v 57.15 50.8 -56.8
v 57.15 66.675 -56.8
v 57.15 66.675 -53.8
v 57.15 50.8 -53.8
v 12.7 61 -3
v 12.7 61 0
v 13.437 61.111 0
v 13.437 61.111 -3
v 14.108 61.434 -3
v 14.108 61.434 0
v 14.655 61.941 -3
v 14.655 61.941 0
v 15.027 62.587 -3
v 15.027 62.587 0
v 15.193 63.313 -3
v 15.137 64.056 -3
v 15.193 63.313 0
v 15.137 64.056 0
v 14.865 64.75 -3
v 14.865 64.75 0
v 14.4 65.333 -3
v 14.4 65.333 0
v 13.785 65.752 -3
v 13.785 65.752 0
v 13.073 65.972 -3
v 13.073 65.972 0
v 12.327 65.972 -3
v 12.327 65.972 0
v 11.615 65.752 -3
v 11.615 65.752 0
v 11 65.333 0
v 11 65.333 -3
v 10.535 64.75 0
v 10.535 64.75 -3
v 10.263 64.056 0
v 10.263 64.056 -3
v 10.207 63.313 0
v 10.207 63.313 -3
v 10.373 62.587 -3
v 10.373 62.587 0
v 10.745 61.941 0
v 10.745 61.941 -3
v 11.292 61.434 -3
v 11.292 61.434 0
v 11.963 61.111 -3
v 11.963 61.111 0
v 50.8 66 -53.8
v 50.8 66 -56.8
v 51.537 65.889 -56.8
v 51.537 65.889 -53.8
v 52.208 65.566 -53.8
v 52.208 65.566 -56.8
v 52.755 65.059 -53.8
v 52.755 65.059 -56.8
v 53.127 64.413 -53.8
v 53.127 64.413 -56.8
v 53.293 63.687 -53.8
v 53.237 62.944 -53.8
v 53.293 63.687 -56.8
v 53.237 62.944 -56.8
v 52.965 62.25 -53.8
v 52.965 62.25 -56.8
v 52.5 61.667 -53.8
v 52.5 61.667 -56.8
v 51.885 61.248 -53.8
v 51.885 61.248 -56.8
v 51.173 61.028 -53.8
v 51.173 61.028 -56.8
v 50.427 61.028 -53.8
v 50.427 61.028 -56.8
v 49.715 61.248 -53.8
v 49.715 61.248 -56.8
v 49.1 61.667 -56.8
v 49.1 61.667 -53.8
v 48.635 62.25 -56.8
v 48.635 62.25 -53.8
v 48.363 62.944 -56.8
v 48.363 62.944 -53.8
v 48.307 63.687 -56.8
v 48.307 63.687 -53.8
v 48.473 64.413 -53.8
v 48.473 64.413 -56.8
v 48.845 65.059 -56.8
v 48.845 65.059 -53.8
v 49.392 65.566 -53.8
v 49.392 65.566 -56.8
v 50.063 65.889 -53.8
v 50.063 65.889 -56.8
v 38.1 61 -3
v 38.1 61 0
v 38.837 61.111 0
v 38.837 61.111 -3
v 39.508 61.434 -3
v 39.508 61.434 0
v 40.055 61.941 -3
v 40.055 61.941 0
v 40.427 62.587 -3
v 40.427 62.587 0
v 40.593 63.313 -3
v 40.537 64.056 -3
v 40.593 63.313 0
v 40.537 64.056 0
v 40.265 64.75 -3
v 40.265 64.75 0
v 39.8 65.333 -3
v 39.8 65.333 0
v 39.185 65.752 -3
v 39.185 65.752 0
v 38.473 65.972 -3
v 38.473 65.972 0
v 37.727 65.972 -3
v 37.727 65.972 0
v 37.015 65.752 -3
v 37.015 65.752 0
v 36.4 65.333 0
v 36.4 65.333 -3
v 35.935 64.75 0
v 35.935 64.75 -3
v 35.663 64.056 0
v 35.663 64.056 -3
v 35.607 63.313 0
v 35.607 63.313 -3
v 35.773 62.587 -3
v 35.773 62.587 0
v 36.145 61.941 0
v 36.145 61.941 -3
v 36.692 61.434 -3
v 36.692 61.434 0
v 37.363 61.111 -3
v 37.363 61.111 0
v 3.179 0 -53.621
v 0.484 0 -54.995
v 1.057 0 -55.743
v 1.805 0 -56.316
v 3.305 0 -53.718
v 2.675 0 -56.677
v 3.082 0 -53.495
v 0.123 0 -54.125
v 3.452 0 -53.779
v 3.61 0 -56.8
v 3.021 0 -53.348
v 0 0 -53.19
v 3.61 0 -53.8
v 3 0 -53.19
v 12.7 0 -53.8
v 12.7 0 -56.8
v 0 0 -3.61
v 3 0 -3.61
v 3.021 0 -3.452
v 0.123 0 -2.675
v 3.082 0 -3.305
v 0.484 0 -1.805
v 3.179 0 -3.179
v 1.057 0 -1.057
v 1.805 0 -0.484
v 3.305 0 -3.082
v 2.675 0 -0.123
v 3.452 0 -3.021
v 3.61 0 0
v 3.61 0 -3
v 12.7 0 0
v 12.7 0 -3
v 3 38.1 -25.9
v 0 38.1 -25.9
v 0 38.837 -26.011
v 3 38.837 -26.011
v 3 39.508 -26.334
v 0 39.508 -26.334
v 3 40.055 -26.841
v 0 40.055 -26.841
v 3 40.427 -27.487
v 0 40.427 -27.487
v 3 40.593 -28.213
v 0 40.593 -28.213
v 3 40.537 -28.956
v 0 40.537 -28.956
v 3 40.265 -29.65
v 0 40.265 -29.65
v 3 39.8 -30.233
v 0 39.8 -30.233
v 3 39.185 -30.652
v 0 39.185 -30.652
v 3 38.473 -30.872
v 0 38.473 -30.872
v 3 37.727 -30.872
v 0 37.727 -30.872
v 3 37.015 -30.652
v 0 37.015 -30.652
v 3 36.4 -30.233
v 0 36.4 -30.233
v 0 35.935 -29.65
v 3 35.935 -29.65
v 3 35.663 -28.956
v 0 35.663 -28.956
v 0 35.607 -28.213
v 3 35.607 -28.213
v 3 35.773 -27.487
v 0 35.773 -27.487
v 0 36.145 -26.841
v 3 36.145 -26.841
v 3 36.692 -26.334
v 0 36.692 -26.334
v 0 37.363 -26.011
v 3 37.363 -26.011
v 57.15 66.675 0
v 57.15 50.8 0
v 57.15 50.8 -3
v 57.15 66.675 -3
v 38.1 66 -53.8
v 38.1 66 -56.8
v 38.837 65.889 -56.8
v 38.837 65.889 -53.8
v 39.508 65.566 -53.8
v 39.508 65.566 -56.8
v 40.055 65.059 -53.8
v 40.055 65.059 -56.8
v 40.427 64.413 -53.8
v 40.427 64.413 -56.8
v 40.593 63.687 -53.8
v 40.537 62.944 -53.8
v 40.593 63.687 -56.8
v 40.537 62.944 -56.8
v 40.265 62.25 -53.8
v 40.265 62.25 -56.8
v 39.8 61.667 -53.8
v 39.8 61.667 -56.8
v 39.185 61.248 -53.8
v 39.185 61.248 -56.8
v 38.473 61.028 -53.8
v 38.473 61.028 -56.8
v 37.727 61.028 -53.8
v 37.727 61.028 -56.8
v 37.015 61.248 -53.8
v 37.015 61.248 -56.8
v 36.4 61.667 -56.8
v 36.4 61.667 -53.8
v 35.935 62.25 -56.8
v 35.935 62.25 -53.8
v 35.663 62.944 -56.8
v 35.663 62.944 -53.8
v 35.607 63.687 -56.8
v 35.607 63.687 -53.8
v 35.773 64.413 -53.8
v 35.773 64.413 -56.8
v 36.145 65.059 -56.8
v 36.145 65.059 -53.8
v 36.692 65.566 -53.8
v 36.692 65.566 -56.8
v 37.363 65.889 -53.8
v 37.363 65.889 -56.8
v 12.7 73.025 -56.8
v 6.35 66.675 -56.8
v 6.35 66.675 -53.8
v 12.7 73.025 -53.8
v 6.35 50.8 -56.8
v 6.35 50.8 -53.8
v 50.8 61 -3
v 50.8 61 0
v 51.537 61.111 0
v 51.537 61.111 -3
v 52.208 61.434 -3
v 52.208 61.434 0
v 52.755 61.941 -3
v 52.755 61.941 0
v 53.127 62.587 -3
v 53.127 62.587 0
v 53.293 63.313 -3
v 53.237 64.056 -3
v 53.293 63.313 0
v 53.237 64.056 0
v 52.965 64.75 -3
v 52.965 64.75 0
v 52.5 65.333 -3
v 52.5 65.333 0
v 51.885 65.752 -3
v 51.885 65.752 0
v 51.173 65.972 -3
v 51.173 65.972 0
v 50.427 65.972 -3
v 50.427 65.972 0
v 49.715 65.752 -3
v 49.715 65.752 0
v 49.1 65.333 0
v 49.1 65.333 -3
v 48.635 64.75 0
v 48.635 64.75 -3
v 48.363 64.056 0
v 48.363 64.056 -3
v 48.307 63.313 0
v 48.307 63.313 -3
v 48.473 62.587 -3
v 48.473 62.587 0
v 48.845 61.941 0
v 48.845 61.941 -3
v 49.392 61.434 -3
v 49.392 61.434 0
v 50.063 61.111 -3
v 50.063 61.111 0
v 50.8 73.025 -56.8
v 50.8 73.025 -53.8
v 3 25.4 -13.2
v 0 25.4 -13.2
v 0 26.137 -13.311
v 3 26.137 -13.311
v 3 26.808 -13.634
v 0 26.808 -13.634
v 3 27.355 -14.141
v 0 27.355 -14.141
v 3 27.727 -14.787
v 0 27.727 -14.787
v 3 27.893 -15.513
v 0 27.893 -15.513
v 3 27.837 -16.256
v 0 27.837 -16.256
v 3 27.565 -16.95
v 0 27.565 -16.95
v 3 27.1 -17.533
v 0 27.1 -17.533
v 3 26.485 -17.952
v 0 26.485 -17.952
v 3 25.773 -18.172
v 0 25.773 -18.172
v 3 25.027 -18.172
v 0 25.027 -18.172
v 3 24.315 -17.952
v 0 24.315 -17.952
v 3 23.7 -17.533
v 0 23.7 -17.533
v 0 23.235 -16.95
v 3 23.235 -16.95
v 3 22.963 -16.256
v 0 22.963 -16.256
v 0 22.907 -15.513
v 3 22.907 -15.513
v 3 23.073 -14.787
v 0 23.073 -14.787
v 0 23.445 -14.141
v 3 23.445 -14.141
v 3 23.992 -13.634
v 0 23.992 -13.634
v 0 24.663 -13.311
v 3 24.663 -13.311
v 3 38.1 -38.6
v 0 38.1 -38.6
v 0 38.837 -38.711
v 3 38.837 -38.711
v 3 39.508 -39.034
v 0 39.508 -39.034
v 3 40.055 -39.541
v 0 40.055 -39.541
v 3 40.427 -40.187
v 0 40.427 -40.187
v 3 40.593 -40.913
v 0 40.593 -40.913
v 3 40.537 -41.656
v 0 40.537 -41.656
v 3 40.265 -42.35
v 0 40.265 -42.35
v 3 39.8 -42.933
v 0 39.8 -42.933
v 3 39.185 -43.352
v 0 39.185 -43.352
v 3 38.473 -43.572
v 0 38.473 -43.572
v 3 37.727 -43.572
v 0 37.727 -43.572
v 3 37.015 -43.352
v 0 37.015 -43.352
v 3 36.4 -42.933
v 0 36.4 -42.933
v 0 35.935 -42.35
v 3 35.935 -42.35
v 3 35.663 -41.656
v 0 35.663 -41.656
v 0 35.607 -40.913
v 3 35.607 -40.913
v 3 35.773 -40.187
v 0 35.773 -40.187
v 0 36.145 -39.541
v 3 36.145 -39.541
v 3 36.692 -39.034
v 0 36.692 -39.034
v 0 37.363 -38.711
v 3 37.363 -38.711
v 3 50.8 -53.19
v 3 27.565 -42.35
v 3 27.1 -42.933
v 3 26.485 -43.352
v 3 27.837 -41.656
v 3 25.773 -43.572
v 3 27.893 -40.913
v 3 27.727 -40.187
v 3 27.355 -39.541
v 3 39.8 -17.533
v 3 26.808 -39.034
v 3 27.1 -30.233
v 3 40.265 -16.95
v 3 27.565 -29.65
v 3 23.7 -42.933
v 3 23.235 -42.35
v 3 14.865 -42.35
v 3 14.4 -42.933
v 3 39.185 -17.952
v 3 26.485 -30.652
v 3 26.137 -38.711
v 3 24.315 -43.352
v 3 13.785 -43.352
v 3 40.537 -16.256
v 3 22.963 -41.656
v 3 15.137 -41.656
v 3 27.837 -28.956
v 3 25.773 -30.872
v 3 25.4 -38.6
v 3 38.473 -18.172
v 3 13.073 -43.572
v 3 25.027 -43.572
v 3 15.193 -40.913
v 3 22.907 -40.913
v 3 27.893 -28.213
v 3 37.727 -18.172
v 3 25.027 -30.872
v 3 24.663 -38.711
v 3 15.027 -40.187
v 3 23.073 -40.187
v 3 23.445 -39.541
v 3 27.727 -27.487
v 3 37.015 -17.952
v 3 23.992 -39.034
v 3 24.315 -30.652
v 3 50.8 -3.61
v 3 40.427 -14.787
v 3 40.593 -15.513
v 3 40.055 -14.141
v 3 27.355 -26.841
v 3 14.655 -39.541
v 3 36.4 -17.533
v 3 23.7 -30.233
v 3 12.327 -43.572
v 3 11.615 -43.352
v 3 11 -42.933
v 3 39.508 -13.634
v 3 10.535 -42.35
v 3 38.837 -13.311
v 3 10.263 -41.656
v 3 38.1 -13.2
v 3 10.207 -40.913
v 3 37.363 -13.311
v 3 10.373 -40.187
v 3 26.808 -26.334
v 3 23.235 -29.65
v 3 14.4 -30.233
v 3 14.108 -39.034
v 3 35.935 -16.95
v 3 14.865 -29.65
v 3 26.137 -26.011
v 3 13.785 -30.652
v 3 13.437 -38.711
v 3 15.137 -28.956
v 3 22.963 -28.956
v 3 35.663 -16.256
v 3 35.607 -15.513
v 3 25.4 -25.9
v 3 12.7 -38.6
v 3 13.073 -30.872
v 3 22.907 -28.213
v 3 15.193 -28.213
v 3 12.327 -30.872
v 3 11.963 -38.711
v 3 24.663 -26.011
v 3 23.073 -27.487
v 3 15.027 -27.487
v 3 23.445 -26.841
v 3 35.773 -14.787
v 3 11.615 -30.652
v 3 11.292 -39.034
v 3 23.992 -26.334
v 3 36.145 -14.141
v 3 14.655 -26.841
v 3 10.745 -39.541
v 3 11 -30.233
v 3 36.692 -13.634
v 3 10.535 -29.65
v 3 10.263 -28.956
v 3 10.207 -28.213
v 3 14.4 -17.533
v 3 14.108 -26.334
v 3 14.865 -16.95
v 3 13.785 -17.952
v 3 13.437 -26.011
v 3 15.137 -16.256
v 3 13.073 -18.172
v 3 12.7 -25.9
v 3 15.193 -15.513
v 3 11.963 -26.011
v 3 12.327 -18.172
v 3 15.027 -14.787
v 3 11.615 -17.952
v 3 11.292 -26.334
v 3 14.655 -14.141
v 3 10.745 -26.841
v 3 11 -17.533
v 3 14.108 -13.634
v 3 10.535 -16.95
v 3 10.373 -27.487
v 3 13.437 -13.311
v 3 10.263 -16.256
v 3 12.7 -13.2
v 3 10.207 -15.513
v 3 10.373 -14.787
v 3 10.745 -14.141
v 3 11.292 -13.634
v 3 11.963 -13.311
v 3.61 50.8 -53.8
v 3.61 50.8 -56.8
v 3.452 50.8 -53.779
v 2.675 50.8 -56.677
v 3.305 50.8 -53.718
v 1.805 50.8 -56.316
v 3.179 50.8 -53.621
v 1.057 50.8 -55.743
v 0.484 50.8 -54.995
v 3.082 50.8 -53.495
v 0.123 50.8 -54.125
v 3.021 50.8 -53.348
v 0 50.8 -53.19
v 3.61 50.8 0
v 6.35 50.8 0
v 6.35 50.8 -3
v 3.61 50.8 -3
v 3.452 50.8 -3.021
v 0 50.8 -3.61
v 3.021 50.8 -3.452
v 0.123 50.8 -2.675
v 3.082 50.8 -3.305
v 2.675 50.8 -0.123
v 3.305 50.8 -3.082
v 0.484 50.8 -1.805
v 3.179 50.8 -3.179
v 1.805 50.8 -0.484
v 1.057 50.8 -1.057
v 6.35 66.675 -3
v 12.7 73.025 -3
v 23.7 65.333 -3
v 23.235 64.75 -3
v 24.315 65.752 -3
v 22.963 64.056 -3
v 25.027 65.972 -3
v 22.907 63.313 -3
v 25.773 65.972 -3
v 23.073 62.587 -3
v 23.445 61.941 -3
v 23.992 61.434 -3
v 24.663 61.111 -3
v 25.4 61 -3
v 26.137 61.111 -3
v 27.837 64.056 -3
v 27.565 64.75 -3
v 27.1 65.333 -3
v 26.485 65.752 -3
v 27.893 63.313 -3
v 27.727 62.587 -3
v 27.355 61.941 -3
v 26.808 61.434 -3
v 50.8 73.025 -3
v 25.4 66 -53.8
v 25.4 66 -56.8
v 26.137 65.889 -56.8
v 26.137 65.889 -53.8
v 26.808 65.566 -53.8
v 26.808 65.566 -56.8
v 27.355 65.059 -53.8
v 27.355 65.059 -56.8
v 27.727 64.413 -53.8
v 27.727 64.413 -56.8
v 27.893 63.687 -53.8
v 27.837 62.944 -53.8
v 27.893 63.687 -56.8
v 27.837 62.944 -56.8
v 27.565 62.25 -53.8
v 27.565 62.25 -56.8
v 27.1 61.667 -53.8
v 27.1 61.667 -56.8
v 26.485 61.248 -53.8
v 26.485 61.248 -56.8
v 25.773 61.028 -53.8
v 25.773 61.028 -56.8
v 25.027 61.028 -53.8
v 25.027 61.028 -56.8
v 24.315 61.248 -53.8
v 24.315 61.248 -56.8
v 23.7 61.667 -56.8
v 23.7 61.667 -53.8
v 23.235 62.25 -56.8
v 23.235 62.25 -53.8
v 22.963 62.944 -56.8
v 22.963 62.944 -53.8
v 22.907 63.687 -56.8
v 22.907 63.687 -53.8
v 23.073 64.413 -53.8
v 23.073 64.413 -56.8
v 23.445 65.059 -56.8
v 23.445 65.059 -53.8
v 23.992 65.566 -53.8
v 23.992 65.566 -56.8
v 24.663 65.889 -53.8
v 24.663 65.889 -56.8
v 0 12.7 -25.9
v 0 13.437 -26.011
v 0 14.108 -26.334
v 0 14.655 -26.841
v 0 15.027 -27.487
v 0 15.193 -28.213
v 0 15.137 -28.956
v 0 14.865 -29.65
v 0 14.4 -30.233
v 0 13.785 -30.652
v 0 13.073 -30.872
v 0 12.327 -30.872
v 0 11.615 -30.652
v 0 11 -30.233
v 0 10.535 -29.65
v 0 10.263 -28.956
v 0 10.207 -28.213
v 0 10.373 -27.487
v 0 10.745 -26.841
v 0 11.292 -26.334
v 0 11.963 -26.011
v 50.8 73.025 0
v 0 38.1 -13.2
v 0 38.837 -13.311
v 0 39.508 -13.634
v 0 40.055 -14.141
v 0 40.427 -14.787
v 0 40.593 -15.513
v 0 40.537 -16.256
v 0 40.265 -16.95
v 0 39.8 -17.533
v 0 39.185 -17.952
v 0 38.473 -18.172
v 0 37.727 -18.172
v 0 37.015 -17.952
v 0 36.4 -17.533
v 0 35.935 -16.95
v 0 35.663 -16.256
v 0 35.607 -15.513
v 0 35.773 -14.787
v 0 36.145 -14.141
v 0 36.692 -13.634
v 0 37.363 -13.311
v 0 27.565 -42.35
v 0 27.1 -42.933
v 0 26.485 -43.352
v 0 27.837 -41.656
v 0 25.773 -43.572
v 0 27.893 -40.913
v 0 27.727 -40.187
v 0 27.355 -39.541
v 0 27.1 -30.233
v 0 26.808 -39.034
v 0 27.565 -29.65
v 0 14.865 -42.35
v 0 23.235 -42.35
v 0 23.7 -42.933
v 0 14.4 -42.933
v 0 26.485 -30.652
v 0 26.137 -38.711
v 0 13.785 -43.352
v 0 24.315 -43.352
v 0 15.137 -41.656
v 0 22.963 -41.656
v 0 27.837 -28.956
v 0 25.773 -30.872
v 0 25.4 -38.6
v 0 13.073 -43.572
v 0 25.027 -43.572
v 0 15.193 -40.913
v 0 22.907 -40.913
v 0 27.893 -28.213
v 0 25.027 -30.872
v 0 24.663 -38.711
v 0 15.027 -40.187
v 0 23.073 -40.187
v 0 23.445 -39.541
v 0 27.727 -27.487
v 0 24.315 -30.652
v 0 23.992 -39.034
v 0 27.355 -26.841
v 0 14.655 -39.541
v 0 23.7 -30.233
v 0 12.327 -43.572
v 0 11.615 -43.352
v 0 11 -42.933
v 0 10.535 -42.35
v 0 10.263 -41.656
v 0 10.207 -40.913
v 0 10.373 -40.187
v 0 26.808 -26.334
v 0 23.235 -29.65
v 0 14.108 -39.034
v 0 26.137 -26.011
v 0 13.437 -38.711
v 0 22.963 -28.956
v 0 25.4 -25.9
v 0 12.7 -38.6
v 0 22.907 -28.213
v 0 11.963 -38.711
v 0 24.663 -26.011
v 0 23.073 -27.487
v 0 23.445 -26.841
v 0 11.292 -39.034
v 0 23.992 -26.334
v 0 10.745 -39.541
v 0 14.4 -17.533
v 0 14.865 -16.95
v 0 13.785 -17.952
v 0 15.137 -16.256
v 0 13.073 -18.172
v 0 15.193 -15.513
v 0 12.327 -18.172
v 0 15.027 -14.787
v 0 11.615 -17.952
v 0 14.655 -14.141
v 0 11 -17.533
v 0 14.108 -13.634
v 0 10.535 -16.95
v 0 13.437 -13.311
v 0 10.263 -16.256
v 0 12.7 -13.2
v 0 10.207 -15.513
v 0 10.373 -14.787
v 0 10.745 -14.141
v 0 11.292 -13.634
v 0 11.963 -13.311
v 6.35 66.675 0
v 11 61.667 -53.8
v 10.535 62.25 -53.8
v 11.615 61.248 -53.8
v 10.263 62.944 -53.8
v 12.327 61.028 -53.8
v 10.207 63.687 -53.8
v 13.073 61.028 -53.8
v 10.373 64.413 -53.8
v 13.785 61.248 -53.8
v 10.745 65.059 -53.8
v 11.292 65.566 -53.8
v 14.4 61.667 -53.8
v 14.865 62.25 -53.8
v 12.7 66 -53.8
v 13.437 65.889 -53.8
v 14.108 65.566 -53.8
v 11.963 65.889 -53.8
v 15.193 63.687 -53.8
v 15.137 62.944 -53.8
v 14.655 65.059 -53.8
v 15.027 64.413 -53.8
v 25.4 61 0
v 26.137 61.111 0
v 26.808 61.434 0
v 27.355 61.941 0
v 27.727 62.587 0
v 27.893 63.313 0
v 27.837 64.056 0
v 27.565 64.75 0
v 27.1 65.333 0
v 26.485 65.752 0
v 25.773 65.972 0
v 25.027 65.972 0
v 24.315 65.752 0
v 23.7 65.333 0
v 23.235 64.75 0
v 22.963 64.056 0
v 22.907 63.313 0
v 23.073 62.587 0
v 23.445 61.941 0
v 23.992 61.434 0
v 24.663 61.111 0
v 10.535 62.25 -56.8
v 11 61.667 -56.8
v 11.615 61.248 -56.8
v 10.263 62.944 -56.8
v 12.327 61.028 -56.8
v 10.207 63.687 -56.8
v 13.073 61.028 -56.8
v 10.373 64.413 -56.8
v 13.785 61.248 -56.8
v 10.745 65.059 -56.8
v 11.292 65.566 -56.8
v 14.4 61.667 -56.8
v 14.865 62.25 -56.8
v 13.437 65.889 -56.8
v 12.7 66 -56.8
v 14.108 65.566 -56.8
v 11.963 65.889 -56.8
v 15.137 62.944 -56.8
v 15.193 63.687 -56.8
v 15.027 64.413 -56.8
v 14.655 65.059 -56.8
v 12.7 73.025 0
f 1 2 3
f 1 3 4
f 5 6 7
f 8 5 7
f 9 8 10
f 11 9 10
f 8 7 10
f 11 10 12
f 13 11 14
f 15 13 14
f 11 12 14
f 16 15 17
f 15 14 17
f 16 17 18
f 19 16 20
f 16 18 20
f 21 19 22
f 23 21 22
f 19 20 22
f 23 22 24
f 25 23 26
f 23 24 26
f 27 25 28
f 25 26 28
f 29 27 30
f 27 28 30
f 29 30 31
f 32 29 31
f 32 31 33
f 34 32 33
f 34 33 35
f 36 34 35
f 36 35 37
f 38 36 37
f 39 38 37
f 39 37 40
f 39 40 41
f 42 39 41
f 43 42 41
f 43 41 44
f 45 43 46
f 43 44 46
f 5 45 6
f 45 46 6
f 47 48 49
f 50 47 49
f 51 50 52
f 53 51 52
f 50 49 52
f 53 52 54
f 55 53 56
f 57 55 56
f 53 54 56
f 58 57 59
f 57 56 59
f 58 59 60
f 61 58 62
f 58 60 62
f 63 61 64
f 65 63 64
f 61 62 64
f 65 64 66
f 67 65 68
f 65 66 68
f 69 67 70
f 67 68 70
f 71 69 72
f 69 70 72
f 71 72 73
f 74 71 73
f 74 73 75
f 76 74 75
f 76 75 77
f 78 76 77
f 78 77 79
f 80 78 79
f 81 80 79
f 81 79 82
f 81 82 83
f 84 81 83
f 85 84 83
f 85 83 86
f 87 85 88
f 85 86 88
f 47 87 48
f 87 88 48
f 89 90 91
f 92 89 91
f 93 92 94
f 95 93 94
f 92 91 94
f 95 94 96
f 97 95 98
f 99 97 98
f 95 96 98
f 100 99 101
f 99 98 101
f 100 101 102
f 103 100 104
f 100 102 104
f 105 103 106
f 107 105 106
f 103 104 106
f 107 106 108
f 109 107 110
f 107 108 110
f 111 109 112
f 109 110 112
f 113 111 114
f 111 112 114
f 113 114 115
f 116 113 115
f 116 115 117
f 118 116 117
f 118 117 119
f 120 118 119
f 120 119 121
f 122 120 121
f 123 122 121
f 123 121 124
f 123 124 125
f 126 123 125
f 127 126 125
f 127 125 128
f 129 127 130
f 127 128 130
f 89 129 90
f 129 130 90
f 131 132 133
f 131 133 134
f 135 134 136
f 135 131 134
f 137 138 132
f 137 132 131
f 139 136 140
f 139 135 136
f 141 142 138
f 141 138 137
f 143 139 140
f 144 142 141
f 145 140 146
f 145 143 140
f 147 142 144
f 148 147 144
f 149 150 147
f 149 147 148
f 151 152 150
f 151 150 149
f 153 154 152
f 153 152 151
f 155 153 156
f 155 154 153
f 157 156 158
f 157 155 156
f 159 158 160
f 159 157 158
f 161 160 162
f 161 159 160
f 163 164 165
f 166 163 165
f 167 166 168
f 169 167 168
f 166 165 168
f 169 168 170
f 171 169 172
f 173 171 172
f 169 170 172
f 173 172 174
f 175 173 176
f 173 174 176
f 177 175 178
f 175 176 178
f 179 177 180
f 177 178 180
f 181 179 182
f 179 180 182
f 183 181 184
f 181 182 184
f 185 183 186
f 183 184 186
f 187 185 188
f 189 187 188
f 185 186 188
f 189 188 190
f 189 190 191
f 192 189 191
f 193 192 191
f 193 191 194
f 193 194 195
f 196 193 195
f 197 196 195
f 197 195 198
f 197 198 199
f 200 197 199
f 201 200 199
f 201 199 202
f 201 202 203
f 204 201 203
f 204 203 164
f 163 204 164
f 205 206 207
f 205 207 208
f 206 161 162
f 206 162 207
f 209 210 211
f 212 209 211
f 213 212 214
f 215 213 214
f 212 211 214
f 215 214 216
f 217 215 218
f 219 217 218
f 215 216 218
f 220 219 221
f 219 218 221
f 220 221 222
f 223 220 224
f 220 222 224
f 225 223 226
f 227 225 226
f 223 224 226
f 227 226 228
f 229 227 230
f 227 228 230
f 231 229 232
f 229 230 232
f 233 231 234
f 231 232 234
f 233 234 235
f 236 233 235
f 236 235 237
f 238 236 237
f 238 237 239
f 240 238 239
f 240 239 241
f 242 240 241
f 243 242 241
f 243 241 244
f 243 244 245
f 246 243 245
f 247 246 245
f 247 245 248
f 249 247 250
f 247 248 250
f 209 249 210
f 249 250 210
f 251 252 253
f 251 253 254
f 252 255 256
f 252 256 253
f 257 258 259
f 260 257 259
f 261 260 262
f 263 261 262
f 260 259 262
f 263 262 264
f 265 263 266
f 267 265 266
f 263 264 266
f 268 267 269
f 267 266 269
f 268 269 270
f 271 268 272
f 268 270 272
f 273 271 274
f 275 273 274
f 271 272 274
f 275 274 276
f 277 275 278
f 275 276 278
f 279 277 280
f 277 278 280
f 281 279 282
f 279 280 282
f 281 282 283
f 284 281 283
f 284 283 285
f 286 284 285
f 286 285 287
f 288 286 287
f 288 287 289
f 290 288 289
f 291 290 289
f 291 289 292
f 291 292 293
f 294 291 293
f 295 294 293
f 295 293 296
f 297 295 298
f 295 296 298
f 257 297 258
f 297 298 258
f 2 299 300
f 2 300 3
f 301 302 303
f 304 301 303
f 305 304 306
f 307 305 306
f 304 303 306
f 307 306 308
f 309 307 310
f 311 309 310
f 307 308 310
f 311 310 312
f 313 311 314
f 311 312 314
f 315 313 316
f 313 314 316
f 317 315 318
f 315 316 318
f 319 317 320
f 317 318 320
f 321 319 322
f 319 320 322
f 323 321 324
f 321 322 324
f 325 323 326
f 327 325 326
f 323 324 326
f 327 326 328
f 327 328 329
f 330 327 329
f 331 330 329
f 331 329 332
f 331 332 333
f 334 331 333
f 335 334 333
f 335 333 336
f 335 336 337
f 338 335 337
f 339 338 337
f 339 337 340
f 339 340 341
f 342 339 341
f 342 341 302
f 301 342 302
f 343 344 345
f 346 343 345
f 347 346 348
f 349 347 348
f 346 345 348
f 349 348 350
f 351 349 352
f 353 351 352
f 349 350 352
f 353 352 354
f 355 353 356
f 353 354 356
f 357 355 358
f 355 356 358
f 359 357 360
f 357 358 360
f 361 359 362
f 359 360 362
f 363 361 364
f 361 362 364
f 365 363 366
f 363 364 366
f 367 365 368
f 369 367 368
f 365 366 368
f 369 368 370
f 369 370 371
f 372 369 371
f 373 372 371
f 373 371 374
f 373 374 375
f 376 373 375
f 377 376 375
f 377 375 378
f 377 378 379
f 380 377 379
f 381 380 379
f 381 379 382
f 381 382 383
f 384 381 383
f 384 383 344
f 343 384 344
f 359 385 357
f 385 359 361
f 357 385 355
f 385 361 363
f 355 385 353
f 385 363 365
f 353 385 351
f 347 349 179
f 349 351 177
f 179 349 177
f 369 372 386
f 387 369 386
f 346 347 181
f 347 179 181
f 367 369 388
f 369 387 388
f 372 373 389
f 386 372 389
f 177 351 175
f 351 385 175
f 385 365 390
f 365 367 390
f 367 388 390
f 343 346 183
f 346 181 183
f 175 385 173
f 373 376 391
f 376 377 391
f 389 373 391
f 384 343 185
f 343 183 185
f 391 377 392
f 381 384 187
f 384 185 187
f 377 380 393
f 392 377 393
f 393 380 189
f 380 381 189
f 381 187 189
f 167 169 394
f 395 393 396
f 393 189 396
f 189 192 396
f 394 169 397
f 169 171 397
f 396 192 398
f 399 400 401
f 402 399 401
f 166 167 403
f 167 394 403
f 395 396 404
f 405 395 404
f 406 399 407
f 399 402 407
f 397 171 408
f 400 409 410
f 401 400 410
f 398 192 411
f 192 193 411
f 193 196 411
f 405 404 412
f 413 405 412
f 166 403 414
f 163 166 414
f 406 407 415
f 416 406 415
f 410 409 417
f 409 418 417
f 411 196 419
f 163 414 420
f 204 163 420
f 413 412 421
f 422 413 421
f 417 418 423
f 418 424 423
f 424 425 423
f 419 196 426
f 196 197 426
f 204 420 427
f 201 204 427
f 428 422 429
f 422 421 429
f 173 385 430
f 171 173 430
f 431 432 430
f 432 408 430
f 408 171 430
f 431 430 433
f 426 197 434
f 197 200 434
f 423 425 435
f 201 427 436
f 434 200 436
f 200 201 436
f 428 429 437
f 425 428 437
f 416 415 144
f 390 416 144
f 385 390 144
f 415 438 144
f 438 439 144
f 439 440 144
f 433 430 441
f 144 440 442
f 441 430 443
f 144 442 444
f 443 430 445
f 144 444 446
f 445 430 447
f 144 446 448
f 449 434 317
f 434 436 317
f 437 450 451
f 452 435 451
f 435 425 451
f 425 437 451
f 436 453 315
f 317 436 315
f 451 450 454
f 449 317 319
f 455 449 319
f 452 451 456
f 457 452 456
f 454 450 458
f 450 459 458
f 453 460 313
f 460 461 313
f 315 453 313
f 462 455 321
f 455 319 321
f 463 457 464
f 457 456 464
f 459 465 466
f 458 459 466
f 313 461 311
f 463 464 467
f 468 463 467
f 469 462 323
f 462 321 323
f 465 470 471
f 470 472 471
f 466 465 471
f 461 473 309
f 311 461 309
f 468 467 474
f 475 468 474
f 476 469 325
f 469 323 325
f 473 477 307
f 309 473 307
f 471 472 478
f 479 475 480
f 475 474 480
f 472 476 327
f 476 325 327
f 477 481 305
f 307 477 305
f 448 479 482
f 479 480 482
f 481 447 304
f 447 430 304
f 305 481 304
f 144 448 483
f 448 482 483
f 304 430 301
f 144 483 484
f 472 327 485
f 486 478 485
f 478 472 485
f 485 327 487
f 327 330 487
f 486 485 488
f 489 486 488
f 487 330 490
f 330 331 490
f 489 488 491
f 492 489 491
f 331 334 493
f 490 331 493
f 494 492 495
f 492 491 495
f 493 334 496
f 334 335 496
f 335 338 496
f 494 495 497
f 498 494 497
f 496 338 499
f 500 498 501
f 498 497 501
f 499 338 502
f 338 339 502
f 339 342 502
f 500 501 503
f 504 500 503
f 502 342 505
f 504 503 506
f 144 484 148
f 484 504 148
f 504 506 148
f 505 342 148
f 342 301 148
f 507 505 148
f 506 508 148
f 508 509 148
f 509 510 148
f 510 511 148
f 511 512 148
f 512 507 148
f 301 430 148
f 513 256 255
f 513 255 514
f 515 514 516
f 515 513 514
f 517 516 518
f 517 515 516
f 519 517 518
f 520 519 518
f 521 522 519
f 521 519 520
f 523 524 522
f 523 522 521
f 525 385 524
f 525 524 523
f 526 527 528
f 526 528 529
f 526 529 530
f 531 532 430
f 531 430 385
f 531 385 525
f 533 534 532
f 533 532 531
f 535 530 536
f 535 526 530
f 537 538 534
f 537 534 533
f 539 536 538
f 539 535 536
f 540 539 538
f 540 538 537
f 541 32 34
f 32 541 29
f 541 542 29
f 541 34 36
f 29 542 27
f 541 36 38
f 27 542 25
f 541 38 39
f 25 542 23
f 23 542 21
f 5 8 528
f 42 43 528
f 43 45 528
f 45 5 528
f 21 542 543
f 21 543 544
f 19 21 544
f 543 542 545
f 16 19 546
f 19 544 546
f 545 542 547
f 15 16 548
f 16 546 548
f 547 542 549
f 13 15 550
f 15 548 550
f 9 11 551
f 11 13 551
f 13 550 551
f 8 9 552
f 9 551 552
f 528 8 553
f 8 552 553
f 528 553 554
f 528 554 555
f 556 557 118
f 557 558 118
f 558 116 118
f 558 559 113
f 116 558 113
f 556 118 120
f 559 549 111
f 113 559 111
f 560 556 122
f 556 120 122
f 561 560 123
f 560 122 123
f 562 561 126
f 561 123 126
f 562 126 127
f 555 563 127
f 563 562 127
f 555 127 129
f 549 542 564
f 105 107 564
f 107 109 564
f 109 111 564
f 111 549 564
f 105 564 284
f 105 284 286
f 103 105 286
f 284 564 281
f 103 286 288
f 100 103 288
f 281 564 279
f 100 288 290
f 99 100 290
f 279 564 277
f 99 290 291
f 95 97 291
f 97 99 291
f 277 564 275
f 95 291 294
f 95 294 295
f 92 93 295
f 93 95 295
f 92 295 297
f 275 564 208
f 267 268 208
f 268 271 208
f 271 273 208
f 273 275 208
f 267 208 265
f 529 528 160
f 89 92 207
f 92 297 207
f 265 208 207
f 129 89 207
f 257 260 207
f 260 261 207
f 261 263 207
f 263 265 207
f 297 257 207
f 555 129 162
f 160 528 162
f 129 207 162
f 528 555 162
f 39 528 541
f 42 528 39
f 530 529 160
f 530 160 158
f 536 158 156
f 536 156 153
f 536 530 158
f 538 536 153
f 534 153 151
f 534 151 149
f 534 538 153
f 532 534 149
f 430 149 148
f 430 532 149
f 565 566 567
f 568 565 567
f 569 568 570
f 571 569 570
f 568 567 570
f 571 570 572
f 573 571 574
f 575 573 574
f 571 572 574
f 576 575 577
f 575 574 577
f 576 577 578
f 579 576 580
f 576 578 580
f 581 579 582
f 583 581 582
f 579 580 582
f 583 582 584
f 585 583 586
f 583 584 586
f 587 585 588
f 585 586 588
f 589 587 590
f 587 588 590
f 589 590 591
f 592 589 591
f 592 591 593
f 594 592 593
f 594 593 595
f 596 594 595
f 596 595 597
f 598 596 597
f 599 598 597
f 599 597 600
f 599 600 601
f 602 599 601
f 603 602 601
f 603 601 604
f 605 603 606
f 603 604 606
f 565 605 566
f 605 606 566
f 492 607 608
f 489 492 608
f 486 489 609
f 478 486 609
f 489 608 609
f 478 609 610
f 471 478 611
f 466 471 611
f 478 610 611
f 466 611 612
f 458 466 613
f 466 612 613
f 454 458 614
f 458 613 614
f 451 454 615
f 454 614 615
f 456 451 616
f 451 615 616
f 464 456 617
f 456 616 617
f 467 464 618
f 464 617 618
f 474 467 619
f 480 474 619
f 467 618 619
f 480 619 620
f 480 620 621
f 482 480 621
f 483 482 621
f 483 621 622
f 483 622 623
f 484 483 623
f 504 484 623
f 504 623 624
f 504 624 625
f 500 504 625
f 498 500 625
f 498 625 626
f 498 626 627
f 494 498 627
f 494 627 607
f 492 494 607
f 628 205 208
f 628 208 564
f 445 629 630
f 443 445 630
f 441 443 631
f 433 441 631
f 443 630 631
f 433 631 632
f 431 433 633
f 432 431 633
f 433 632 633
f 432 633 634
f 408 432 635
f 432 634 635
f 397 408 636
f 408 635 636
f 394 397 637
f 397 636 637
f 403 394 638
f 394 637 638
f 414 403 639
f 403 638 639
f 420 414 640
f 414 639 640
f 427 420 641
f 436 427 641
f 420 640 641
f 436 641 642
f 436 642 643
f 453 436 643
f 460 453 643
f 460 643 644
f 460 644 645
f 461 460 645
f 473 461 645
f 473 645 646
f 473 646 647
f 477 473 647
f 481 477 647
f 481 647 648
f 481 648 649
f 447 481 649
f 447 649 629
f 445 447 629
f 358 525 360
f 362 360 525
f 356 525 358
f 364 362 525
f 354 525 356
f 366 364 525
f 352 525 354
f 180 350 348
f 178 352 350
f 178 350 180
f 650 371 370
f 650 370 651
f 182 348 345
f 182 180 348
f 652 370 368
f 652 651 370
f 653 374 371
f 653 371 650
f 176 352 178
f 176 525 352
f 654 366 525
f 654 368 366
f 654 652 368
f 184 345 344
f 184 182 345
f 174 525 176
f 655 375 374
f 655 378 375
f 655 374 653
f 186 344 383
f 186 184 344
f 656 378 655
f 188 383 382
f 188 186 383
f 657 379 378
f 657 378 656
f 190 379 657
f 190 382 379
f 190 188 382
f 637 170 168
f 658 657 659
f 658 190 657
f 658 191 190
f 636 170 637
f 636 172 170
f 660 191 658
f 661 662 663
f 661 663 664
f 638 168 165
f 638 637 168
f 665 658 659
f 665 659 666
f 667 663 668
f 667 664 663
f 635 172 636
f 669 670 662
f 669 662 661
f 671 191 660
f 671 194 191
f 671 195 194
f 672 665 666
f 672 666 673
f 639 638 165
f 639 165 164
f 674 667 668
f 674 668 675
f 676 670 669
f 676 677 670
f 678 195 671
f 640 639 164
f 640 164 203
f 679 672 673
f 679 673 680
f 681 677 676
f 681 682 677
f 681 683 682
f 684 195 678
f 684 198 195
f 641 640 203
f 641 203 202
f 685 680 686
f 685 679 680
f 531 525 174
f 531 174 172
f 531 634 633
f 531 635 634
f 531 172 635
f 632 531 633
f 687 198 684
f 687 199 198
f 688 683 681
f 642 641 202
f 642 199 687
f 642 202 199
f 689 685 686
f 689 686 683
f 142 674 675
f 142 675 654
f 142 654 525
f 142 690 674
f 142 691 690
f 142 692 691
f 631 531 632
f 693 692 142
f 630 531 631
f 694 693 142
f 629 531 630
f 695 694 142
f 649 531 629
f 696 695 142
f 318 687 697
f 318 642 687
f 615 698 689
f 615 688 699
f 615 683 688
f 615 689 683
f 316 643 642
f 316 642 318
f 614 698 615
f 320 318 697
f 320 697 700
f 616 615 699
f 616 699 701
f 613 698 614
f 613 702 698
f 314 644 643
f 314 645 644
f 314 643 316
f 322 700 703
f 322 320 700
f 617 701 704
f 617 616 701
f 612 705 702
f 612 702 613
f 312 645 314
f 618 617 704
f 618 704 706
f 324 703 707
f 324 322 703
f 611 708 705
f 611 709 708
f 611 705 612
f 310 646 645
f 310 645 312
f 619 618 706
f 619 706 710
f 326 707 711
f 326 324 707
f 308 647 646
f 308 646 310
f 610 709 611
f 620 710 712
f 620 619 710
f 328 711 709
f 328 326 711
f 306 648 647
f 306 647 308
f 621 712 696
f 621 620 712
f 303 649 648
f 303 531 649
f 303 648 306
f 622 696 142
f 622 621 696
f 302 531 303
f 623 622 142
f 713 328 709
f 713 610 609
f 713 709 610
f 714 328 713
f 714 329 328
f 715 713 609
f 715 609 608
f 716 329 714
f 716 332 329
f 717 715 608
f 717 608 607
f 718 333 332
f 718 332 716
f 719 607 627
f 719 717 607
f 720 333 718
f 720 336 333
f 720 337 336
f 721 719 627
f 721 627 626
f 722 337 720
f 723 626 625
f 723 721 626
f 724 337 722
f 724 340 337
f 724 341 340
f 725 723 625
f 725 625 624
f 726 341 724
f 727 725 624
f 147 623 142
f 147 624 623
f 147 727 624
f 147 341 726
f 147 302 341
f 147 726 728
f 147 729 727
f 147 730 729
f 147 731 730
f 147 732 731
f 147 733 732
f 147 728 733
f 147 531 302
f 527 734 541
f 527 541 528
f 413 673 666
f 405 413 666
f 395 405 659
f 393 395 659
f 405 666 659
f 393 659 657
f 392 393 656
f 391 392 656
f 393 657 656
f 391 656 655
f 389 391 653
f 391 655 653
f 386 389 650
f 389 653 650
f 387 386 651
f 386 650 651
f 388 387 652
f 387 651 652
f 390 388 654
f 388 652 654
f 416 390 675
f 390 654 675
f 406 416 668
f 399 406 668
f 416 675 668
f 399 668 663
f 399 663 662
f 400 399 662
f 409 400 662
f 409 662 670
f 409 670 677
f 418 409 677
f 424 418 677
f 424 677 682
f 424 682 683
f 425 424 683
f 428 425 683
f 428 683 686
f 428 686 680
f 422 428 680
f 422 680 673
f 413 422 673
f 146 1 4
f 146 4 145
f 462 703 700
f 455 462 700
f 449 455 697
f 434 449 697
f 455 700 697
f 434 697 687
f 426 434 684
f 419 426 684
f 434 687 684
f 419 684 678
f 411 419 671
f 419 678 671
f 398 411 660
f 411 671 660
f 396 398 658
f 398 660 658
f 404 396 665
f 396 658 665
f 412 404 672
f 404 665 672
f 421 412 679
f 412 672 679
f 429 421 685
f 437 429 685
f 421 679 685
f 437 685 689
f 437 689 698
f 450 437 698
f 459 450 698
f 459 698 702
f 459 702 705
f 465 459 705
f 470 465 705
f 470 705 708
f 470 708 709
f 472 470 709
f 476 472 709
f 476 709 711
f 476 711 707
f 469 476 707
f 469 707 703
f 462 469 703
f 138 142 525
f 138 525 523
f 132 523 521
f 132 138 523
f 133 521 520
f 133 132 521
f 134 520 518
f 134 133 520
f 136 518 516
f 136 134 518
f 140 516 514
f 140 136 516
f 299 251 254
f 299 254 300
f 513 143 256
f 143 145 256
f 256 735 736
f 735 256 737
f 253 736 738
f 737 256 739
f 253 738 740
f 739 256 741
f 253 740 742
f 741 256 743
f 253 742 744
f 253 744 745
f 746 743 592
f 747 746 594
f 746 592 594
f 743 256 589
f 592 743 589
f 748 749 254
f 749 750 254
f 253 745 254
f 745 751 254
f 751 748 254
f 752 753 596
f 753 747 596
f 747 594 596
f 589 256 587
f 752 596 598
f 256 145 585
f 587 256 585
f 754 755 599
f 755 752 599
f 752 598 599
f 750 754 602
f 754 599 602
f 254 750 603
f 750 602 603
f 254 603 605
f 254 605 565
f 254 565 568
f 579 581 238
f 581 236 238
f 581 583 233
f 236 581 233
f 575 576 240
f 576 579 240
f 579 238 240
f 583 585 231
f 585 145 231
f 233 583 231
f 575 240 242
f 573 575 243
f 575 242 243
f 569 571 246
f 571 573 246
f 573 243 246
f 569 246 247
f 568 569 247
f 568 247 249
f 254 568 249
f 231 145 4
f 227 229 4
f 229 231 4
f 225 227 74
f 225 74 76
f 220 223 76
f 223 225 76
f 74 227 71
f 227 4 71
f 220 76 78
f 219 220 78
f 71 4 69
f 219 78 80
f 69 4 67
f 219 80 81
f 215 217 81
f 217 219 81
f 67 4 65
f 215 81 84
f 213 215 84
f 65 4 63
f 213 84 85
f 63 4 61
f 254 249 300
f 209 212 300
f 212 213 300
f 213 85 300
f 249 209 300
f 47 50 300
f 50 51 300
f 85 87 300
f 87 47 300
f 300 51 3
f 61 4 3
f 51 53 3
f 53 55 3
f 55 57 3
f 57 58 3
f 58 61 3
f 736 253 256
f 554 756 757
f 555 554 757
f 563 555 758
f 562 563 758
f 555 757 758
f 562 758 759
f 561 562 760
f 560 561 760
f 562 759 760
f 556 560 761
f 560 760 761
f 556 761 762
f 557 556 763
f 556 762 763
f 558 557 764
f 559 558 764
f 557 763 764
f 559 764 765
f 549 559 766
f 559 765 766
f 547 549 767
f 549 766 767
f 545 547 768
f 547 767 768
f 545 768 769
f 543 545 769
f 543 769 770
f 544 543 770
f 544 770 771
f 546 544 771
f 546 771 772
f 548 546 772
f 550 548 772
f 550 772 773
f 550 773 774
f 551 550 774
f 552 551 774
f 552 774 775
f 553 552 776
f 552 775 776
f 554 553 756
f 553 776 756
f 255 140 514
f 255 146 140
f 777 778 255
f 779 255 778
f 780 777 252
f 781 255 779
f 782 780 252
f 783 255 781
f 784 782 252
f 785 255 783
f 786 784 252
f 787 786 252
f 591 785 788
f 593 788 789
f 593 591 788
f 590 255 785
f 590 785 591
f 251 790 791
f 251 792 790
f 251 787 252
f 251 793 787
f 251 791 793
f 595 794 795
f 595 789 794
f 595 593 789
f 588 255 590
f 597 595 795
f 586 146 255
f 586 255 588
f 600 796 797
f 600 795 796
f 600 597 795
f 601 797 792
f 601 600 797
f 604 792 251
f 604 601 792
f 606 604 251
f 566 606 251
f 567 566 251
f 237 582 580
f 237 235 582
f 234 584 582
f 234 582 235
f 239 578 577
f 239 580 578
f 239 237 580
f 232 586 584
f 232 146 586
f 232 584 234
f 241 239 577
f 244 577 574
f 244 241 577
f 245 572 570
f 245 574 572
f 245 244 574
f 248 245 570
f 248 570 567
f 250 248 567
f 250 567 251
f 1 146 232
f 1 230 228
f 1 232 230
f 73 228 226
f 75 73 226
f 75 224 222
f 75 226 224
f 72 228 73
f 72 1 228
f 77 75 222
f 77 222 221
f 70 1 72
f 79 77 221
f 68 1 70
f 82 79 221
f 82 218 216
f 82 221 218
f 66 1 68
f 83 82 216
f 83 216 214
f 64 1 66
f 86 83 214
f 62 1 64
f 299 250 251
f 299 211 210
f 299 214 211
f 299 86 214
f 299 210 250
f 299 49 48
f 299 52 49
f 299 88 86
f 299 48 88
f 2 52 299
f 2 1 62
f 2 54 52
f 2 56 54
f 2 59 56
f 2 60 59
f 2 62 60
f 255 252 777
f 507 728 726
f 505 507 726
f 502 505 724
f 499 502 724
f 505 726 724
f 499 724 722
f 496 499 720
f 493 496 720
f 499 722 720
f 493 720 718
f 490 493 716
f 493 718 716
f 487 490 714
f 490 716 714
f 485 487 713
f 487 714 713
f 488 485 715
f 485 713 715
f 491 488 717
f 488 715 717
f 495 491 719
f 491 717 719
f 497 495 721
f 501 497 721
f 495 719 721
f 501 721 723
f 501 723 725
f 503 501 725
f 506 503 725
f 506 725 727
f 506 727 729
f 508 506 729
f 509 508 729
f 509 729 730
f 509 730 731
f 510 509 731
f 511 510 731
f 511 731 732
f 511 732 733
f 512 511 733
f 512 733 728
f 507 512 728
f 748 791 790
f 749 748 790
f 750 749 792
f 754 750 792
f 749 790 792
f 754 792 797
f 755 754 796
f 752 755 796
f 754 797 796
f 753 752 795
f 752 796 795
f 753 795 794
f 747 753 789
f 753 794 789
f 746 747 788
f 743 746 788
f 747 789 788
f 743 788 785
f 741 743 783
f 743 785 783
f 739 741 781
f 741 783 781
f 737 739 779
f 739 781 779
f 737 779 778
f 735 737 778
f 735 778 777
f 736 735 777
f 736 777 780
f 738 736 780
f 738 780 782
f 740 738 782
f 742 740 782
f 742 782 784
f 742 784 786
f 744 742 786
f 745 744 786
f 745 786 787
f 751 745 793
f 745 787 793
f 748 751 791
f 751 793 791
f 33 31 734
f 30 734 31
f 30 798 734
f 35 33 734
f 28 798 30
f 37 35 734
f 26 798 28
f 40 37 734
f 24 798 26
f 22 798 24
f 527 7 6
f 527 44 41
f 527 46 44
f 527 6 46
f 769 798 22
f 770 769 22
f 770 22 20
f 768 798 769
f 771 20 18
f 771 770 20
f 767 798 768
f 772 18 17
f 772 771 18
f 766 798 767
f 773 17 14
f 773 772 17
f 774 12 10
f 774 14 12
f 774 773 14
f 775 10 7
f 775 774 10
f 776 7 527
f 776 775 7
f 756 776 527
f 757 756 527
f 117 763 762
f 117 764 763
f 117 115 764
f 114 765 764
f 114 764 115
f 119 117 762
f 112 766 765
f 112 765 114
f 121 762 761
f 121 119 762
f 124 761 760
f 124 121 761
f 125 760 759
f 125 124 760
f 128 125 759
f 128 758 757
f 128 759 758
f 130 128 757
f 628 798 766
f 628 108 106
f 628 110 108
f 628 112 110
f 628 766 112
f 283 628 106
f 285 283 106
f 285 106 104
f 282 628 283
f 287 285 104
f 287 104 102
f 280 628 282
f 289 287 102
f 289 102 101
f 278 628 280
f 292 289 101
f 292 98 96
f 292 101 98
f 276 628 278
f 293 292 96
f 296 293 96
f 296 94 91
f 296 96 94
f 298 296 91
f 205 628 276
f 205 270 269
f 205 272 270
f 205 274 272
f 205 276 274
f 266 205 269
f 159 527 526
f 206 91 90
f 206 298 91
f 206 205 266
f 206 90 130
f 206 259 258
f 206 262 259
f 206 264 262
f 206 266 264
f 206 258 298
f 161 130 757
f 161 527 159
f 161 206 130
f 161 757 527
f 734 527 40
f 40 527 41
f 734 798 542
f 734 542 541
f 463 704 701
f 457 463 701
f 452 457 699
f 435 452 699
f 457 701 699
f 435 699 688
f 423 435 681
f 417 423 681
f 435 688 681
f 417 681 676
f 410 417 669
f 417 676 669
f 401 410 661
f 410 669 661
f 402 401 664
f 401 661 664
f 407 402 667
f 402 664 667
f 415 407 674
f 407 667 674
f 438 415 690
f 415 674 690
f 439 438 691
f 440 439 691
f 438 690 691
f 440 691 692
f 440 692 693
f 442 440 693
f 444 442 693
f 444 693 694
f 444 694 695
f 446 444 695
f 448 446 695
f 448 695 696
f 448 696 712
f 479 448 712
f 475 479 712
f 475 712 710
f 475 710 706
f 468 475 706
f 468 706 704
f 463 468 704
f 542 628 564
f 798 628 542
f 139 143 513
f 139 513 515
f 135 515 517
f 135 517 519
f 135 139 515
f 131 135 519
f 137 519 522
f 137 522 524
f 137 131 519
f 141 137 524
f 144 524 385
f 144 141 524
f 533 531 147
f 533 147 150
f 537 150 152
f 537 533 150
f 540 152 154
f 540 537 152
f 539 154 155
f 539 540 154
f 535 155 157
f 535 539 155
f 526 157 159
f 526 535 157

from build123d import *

# Parameters (mm, degrees)
SKETCH7_W               = 50.8
SKETCH7_H               = 49.5808
BASE_FLANGE1_DEPTH      = 3
F_10_CLEARANCE_HOLE1_D  = 5
EDGE_FLANGE1_DEPTH      = 50.8
EDGE_FLANGE1_START      = 3
EDGE_FLANGE1_PROFILE_R  = 2.5
EDGE_FLANGE1_FLAT_DEPTH = 3
EDGE_FLANGE2_DEPTH      = 50.8
EDGE_FLANGE2_START      = 3
EDGE_FLANGE2_PROFILE_R  = 2.5
EDGE_FLANGE2_FLAT_DEPTH = 3


# Sheet-metal steps are written as plain solids
with BuildPart() as part:
    # Sketch7 → Base-Flange1 (new body)
    with BuildSketch(Plane(origin=(0, 0, 0), x_dir=(0, -1, 0), z_dir=(-1, 0, 0))):
        with Locations((-25.4, -28.4)):
            Rectangle(SKETCH7_W, SKETCH7_H)
    extrude(amount=-BASE_FLANGE1_DEPTH)

    # #10 Clearance Hole1 (through all)
    with Locations(Plane(origin=(3, 0, 0), x_dir=(0, 0, -1), z_dir=(1, 0, 0))):
        with Locations((41.1, 12.7), (41.1, 25.4), (28.4, 25.4), (28.4, 12.7), (15.7, 12.7), (15.7, 25.4), (15.7, 38.1), (28.4, 38.1), (41.1, 38.1)):
            Hole(F_10_CLEARANCE_HOLE1_D / 2)

    # Edge-Flange1 bend section (across the edge) → Edge-Flange1 (add)
    with BuildSketch(Plane(origin=(3, 0, -53.8), x_dir=(0, 0, 1), z_dir=(0, 1, 0))):
        with BuildLine():
            Line((-3, 0.6096), (0, 0.6096))
            ThreePointArc((0, 0.6096), (0.178547706, 0.178547706), (0.6096, 0))
            Line((0.6096, 0), (0.6096, -3))
            ThreePointArc((0.6096, -3), (-1.942772637, -1.942772637), (-3, 0.6096))
        make_face()
    extrude(amount=EDGE_FLANGE1_DEPTH)

    # Edge-Flange1 profile (on flange) → Edge-Flange1 flat (add)
    with BuildSketch(Plane(origin=(3, 0, -53.8), x_dir=(0, 1, 0), z_dir=(0, 0, -1)).offset(EDGE_FLANGE1_START)):
        Polygon((0, 0.6096), (50.8, 0.6096), (50.8, 3.35), (66.675, 3.35), (73.025, 9.7), (73.025, 47.8), (66.675, 54.15), (50.8, 54.15), (0, 9.7), align=None)
        with Locations((63.5, 9.7)):
            Circle(EDGE_FLANGE1_PROFILE_R, mode=Mode.SUBTRACT)
        with Locations((63.5, 22.4)):
            Circle(EDGE_FLANGE1_PROFILE_R, mode=Mode.SUBTRACT)
        with Locations((63.5, 35.1)):
            Circle(EDGE_FLANGE1_PROFILE_R, mode=Mode.SUBTRACT)
        with Locations((63.5, 47.8)):
            Circle(EDGE_FLANGE1_PROFILE_R, mode=Mode.SUBTRACT)
    extrude(amount=-EDGE_FLANGE1_FLAT_DEPTH)

    # Edge-Flange2 bend section (across the edge) → Edge-Flange2 (add)
    with BuildSketch(Plane(origin=(3, 50.8, -3), x_dir=(0, 0, -1), z_dir=(0, -1, 0))):
        with BuildLine():
            Line((-3, 0.6096), (0, 0.6096))
            ThreePointArc((0, 0.6096), (0.178547706, 0.178547706), (0.6096, 0))
            Line((0.6096, 0), (0.6096, -3))
            ThreePointArc((0.6096, -3), (-1.942772637, -1.942772637), (-3, 0.6096))
        make_face()
    extrude(amount=EDGE_FLANGE2_DEPTH)

    # Edge-Flange2 profile (on flange) → Edge-Flange2 flat (add)
    with BuildSketch(Plane(origin=(3, 0, -3), x_dir=(0, -1, 0), z_dir=(0, 0, 1)).offset(EDGE_FLANGE2_START)):
        Polygon((0, 0.6096), (0, 9.7), (-50.8, 54.15), (-66.675, 54.15), (-73.025, 47.8), (-73.025, 9.7), (-66.675, 3.35), (-50.8, 3.35), (-50.8, 0.6096), align=None)
        with Locations((-63.5, 9.7)):
            Circle(EDGE_FLANGE2_PROFILE_R, mode=Mode.SUBTRACT)
        with Locations((-63.5, 22.4)):
            Circle(EDGE_FLANGE2_PROFILE_R, mode=Mode.SUBTRACT)
        with Locations((-63.5, 35.1)):
            Circle(EDGE_FLANGE2_PROFILE_R, mode=Mode.SUBTRACT)
        with Locations((-63.5, 47.8)):
            Circle(EDGE_FLANGE2_PROFILE_R, mode=Mode.SUBTRACT)
    extrude(amount=-EDGE_FLANGE2_FLAT_DEPTH)


solid = part.part
